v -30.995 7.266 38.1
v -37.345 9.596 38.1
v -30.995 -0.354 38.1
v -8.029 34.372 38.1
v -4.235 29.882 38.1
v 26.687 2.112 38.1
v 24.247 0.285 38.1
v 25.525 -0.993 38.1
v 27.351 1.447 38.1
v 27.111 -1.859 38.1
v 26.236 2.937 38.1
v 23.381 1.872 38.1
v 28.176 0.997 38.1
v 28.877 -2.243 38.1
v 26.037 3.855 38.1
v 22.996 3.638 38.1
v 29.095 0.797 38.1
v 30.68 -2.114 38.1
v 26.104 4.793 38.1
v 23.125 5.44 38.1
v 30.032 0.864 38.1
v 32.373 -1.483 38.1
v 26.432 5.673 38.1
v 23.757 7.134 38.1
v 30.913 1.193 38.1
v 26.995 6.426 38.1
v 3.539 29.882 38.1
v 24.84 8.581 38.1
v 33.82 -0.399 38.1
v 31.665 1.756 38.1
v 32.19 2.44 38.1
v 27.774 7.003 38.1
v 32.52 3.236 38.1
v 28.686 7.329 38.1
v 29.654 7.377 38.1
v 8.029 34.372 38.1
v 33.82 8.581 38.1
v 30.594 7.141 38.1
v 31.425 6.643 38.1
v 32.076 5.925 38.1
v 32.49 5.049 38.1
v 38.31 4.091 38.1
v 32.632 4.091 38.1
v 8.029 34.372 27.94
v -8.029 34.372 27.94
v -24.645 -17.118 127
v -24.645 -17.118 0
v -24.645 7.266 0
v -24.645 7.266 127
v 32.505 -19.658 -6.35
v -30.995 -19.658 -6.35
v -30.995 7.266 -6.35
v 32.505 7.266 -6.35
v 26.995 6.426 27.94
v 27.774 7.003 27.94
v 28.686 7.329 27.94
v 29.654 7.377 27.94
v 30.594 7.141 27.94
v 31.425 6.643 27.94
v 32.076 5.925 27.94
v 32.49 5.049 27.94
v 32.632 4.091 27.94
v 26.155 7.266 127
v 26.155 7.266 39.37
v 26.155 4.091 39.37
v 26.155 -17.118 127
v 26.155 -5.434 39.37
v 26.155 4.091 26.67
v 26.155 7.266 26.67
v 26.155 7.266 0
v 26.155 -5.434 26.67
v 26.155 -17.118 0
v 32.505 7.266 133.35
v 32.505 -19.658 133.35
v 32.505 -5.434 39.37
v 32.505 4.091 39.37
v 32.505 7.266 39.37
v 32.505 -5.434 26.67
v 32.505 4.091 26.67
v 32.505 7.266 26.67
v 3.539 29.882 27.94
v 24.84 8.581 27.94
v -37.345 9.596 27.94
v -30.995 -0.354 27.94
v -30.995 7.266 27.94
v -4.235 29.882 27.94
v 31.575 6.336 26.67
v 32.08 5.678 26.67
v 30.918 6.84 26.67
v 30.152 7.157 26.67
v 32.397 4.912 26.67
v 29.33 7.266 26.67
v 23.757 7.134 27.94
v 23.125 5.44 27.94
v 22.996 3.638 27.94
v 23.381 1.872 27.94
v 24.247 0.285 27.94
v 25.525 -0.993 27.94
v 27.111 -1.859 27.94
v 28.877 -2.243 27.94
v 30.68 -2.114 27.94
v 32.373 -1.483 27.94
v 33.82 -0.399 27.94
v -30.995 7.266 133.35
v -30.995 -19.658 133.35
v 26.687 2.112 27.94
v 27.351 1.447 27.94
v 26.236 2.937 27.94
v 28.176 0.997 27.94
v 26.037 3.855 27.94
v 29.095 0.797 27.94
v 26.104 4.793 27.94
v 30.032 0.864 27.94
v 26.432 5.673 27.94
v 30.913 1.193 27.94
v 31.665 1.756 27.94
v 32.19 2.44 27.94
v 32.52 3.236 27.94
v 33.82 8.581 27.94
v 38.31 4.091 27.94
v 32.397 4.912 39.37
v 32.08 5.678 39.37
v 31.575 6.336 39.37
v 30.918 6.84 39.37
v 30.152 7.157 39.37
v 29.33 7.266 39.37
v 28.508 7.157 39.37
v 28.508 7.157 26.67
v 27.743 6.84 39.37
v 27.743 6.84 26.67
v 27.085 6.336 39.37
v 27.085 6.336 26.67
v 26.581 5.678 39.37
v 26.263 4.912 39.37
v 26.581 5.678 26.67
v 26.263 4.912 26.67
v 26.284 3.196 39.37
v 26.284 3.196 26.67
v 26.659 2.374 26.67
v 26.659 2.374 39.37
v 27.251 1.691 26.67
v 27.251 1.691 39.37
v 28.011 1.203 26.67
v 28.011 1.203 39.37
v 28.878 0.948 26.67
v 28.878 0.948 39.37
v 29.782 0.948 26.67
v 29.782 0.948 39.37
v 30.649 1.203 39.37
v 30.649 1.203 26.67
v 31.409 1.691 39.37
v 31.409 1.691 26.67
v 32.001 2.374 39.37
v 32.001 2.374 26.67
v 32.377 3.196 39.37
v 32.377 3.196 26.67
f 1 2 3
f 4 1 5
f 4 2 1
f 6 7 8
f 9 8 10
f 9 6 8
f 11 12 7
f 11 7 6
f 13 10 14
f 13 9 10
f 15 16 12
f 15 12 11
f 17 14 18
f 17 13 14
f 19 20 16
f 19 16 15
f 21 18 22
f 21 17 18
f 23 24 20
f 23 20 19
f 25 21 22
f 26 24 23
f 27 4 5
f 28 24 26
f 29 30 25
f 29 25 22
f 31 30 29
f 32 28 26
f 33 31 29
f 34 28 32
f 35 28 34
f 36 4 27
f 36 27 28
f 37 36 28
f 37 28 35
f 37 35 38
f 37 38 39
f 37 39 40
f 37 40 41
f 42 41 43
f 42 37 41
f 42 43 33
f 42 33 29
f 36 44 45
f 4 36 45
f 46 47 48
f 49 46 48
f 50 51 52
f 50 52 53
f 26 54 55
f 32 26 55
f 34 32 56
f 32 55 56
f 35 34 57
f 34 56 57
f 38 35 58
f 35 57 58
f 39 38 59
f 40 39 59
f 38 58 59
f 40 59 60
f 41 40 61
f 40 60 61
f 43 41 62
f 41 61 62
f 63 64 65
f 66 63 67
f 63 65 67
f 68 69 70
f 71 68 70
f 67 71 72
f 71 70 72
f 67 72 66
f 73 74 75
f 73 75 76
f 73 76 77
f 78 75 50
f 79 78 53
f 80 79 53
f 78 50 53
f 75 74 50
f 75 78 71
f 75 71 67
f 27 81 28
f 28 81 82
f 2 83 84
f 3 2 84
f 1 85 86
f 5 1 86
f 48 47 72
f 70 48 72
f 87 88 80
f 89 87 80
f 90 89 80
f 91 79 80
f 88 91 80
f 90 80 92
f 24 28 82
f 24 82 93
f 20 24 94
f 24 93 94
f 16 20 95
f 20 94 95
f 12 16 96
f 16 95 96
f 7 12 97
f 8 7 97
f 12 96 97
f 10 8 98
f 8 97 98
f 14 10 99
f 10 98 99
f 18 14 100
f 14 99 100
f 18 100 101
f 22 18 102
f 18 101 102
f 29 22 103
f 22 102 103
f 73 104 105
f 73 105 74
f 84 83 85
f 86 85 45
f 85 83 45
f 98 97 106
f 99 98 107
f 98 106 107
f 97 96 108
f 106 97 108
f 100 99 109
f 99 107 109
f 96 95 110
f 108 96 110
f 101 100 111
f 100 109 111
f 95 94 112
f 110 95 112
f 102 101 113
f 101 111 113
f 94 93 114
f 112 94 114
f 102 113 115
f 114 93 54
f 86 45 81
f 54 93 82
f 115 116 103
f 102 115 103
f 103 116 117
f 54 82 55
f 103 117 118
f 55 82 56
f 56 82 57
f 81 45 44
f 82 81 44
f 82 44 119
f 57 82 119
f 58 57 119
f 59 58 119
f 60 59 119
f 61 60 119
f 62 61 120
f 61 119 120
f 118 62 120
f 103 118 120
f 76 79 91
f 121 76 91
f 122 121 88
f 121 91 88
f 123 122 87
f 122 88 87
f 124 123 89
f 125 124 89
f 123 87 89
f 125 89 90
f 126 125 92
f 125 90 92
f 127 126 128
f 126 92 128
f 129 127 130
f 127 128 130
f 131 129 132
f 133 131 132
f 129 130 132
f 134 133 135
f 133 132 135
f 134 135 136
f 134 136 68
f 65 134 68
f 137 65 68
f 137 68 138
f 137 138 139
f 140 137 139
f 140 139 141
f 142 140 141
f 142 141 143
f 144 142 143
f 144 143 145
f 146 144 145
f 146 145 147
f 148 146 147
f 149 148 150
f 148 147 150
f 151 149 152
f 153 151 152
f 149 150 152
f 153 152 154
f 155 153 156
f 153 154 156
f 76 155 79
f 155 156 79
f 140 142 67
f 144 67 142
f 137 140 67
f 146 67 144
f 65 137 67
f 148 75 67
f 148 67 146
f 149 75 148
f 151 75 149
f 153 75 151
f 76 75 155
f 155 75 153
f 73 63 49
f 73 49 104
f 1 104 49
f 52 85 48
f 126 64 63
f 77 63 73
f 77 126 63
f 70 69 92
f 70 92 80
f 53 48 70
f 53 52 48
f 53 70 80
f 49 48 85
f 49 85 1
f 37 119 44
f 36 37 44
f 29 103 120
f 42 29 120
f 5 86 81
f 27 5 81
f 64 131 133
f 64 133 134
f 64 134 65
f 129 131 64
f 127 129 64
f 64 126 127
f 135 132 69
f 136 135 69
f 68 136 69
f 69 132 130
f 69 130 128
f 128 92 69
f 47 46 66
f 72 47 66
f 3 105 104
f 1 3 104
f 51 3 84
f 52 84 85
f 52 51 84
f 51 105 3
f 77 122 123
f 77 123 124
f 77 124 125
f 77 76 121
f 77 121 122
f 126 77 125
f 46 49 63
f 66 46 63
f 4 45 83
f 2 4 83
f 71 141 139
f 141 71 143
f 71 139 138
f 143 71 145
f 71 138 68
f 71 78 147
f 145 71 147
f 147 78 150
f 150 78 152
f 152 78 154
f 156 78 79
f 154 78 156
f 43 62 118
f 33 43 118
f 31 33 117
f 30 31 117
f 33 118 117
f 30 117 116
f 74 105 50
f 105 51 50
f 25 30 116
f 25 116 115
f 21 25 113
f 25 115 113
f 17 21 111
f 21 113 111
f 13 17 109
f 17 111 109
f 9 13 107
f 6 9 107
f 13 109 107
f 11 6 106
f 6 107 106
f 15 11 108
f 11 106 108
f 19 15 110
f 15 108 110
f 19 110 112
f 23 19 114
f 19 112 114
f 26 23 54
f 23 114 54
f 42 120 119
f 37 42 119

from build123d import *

# Parameters (mm, degrees)
F0_W      = 50.8
F0_H      = 2.54
F1_DEPTH  = 127
F2_W      = 63.5
F2_H      = 26.924
F3_DEPTH  = 6.35
F4_W      = 63.5
F4_H      = 26.924
F5_DEPTH  = 6.35
F6_W      = 12.7
F6_H      = 12.7
F7_DEPTH  = 6.35
F8_R      = 3.175
F9_DEPTH  = 12.7
F11_START = 1.27
F10_W     = 2.54
F10_H     = 2.54
F11_DEPTH = 10.16


with BuildPart() as f1:
    # F0 (on Top) → F1 (new body)
    with BuildSketch(Plane.XY):
        with Locations((0.755213508, -18.3883576206)):
            Rectangle(F0_W, F0_H)
        Polygon((-24.644786492, -19.6583576206), (-24.644786492, -17.1183576206), (-24.644786492, 7.2656423794), (-30.994786492, 7.2656423794), (-30.994786492, -19.6583576206), align=None)
        Polygon((26.155213508, 7.2656423794), (26.155213508, -17.1183576206), (26.155213508, -19.6583576206), (32.505213508, -19.6583576206), (32.505213508, 7.2656423794), align=None)
    extrude(amount=F1_DEPTH)

    # F2 (on face) → F3 (join)
    with BuildSketch(Plane(origin=(0, 0, 0), x_dir=(1, 0, 0), z_dir=(0, 0, -1))):
        with Locations((0.755213508, 6.1963576206)):
            Rectangle(F2_W, F2_H)
    extrude(amount=F3_DEPTH)

    # F4 (on face) → F5 (join)
    with BuildSketch(Plane.XY.offset(127)):
        with Locations((0.755213508, -6.1963576206)):
            Rectangle(F4_W, F4_H)
    extrude(amount=F5_DEPTH)

    # F6 (on face) → F7 (cut, through all)
    with BuildSketch(Plane.YZ.offset(32.505213508)):
        with Locations((0.9156423794, 33.02)):
            Rectangle(F6_W, F6_H)
    extrude(amount=-F7_DEPTH, mode=Mode.SUBTRACT)

    # F8 (on face) → F9 (join, through all)
    with BuildSketch(Plane.XY.offset(26.67)):
        with Locations((29.330213508, 4.0906423794)):
            Circle(F8_R)
    extrude(amount=F9_DEPTH)

    # F10 (on face) → F11 (join)
    with BuildSketch(Plane.XY.offset(26.67).offset(F11_START)):
        with BuildLine():
            ThreePointArc((26.9953469165, 6.4255089708), (30.5938342017, 7.1412925957), (32.632213508, 4.0906423794))
            ThreePointArc((32.632213508, 4.0906423794), (32.3808637244, 2.8270216857), (31.6650800995, 1.7557757879))
            Line((31.6650800995, 1.7557757879), (33.8203415686, -0.3994856812))
            ThreePointArc((33.8203415686, -0.3994856812), (35.1968485395, 1.6606025838), (35.680213508, 4.0906423794))
            ThreePointArc((35.680213508, 4.0906423794), (35.1968485273, 6.5206822043), (33.8203415234, 8.580770485))
            ThreePointArc((33.8203415234, 8.580770485), (29.3302134761, 10.4406423794), (24.8400854475, 8.5807704399))
            Line((24.8400854475, 8.5807704399), (26.9953469165, 6.4255089708))
        make_face()
        with BuildLine():
            ThreePointArc((31.6650800995, 1.7557757879), (26.9953469165, 1.7557757879), (26.9953469165, 6.4255089708))
            Line((26.9953469165, 6.4255089708), (24.8400854475, 8.5807704399))
            ThreePointArc((24.8400854475, 8.5807704399), (24.8400854475, -0.3994856812), (33.8203415686, -0.3994856812))
            Line((33.8203415686, -0.3994856812), (31.6650800995, 1.7557757879))
        make_face()
        with BuildLine():
            Line((3.539213508, 29.8816423794), (24.8400854475, 8.5807704399))
            ThreePointArc((24.8400854475, 8.5807704399), (29.3302134761, 10.4406423794), (33.8203415234, 8.580770485))
            Line((33.8203415234, 8.580770485), (8.0293415685, 34.3717704399))
            Line((8.0293415685, 34.3717704399), (8.0293415685, 29.8816423794))
            Line((8.0293415685, 29.8816423794), (3.539213508, 29.8816423794))
        make_face()
        with BuildLine():
            ThreePointArc((35.680213508, 4.0906423794), (35.1968485395, 1.6606025838), (33.8203415686, -0.3994856812))
            Line((33.8203415686, -0.3994856812), (38.3104696291, 4.0906423794))
            Line((38.3104696291, 4.0906423794), (33.8203415234, 8.580770485))
            ThreePointArc((33.8203415234, 8.580770485), (35.1968485273, 6.5206822043), (35.680213508, 4.0906423794))
        make_face()
        Polygon((-4.2345756454, 29.8816423794), (3.539213508, 29.8816423794), (8.0293415685, 34.3717704399), (-8.0293415685, 34.3717704399), align=None)
        Polygon((8.0293415685, 34.3717704399), (3.539213508, 29.8816423794), (8.0293415685, 29.8816423794), align=None)
        Polygon((-30.994786492, 7.2656423794), (-4.2345756454, 29.8816423794), (-8.0293415685, 29.8816423794), (-8.0293415685, 34.3717704399), (-37.344786492, 9.5962518093), (-33.5500205688, 5.1061237488), align=None)
        Polygon((-8.0293415685, 29.8816423794), (-4.2345756454, 29.8816423794), (-8.0293415685, 34.3717704399), align=None)
        Polygon((-30.994786492, 2.1856423794), (-30.994786492, 7.2656423794), (-33.5500205688, 5.1061237488), (-37.344786492, 9.5962518093), (-30.994786492, -0.3543576206), align=None)
        with Locations((-29.724786492, 0.9156423794)):
            Rectangle(F10_W, F10_H)
    extrude(amount=F11_DEPTH)


solid = f1.part
